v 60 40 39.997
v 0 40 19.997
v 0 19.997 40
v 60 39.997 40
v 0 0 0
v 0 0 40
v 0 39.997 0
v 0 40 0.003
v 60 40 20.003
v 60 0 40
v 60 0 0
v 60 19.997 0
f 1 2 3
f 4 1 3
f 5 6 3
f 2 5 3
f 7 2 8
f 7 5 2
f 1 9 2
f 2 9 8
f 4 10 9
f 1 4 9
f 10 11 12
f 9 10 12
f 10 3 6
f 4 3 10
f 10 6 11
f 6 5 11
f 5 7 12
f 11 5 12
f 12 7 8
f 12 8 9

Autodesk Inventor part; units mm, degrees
ref_plane "YZ Plane" through (0, 0, 0) normal (1, 0, 0) x (0, 1, 0)
sketch "草圖1" plane through (0, 0, 0) normal (0, 0, 1) x (1, 0, 0)
  line L0 (-12, 0) -> (72, 0) projected
  line L1 (0, -8) -> (0, 48) projected
  line L2 (0, 0) -> (60, 0)
  line L3 (60, 0) -> (60, 40)
  line L4 (60, 40) -> (0, 40)
  line L5 (0, 40) -> (0, 0)
  dimension "d0" = 60
  dimension "d1" = 40
extrude "擠出1" add sketch "草圖1" along normal blind 40
ref_plane "工作平面1" through (0, 40, 20) normal (-0.2294, 0.6882, 0.6882) x (0, -0.7071, 0.7071)
sketch "草圖2" plane through (0, 40, 20) normal (-0.2294, 0.6882, 0.6882) x (0, -0.7071, 0.7071)
  line L0 (42.4264, 55.1553) -> (14.1421, 61.6441) projected
  line L1 (14.1421, 3.2444) -> (42.4264, -3.2444) projected
  line L2 (-14.1421, -3.2444) -> (14.1421, 3.2444) projected
  line L3 (-24.1266, -29.4243) -> (37.1709, -29.4243)
  line L4 (37.1709, -29.4243) -> (37.1709, 87.3992)
  line L5 (37.1709, 87.3992) -> (-24.1266, 87.3992)
  line L6 (-24.1266, 87.3992) -> (-24.1266, -29.4243)
  point P0 (14.1421, -9.7333)
extrude "擠出2" cut sketch "草圖2" along normal blind 40
ref_plane "工作平面3" through (0, 40, 0) normal (0.2294, 0.6882, -0.6882) x (0.9487, 0, 0.3162)
sketch "草圖4" plane through (0, 40, 0) normal (0.2294, 0.6882, -0.6882) x (0.9487, 0, 0.3162)
  line L0 (-18.5971, -44.6398) -> (132.4913, -44.6398)
  line L1 (132.4913, -44.6398) -> (132.4913, 100.0809)
  line L2 (132.4913, 100.0809) -> (-18.5971, 100.0809)
  line L3 (-18.5971, 100.0809) -> (-18.5971, -44.6398)
  point P0 (0, 29.0191)
extrude "擠出4" cut sketch "草圖4" along normal blind 40
